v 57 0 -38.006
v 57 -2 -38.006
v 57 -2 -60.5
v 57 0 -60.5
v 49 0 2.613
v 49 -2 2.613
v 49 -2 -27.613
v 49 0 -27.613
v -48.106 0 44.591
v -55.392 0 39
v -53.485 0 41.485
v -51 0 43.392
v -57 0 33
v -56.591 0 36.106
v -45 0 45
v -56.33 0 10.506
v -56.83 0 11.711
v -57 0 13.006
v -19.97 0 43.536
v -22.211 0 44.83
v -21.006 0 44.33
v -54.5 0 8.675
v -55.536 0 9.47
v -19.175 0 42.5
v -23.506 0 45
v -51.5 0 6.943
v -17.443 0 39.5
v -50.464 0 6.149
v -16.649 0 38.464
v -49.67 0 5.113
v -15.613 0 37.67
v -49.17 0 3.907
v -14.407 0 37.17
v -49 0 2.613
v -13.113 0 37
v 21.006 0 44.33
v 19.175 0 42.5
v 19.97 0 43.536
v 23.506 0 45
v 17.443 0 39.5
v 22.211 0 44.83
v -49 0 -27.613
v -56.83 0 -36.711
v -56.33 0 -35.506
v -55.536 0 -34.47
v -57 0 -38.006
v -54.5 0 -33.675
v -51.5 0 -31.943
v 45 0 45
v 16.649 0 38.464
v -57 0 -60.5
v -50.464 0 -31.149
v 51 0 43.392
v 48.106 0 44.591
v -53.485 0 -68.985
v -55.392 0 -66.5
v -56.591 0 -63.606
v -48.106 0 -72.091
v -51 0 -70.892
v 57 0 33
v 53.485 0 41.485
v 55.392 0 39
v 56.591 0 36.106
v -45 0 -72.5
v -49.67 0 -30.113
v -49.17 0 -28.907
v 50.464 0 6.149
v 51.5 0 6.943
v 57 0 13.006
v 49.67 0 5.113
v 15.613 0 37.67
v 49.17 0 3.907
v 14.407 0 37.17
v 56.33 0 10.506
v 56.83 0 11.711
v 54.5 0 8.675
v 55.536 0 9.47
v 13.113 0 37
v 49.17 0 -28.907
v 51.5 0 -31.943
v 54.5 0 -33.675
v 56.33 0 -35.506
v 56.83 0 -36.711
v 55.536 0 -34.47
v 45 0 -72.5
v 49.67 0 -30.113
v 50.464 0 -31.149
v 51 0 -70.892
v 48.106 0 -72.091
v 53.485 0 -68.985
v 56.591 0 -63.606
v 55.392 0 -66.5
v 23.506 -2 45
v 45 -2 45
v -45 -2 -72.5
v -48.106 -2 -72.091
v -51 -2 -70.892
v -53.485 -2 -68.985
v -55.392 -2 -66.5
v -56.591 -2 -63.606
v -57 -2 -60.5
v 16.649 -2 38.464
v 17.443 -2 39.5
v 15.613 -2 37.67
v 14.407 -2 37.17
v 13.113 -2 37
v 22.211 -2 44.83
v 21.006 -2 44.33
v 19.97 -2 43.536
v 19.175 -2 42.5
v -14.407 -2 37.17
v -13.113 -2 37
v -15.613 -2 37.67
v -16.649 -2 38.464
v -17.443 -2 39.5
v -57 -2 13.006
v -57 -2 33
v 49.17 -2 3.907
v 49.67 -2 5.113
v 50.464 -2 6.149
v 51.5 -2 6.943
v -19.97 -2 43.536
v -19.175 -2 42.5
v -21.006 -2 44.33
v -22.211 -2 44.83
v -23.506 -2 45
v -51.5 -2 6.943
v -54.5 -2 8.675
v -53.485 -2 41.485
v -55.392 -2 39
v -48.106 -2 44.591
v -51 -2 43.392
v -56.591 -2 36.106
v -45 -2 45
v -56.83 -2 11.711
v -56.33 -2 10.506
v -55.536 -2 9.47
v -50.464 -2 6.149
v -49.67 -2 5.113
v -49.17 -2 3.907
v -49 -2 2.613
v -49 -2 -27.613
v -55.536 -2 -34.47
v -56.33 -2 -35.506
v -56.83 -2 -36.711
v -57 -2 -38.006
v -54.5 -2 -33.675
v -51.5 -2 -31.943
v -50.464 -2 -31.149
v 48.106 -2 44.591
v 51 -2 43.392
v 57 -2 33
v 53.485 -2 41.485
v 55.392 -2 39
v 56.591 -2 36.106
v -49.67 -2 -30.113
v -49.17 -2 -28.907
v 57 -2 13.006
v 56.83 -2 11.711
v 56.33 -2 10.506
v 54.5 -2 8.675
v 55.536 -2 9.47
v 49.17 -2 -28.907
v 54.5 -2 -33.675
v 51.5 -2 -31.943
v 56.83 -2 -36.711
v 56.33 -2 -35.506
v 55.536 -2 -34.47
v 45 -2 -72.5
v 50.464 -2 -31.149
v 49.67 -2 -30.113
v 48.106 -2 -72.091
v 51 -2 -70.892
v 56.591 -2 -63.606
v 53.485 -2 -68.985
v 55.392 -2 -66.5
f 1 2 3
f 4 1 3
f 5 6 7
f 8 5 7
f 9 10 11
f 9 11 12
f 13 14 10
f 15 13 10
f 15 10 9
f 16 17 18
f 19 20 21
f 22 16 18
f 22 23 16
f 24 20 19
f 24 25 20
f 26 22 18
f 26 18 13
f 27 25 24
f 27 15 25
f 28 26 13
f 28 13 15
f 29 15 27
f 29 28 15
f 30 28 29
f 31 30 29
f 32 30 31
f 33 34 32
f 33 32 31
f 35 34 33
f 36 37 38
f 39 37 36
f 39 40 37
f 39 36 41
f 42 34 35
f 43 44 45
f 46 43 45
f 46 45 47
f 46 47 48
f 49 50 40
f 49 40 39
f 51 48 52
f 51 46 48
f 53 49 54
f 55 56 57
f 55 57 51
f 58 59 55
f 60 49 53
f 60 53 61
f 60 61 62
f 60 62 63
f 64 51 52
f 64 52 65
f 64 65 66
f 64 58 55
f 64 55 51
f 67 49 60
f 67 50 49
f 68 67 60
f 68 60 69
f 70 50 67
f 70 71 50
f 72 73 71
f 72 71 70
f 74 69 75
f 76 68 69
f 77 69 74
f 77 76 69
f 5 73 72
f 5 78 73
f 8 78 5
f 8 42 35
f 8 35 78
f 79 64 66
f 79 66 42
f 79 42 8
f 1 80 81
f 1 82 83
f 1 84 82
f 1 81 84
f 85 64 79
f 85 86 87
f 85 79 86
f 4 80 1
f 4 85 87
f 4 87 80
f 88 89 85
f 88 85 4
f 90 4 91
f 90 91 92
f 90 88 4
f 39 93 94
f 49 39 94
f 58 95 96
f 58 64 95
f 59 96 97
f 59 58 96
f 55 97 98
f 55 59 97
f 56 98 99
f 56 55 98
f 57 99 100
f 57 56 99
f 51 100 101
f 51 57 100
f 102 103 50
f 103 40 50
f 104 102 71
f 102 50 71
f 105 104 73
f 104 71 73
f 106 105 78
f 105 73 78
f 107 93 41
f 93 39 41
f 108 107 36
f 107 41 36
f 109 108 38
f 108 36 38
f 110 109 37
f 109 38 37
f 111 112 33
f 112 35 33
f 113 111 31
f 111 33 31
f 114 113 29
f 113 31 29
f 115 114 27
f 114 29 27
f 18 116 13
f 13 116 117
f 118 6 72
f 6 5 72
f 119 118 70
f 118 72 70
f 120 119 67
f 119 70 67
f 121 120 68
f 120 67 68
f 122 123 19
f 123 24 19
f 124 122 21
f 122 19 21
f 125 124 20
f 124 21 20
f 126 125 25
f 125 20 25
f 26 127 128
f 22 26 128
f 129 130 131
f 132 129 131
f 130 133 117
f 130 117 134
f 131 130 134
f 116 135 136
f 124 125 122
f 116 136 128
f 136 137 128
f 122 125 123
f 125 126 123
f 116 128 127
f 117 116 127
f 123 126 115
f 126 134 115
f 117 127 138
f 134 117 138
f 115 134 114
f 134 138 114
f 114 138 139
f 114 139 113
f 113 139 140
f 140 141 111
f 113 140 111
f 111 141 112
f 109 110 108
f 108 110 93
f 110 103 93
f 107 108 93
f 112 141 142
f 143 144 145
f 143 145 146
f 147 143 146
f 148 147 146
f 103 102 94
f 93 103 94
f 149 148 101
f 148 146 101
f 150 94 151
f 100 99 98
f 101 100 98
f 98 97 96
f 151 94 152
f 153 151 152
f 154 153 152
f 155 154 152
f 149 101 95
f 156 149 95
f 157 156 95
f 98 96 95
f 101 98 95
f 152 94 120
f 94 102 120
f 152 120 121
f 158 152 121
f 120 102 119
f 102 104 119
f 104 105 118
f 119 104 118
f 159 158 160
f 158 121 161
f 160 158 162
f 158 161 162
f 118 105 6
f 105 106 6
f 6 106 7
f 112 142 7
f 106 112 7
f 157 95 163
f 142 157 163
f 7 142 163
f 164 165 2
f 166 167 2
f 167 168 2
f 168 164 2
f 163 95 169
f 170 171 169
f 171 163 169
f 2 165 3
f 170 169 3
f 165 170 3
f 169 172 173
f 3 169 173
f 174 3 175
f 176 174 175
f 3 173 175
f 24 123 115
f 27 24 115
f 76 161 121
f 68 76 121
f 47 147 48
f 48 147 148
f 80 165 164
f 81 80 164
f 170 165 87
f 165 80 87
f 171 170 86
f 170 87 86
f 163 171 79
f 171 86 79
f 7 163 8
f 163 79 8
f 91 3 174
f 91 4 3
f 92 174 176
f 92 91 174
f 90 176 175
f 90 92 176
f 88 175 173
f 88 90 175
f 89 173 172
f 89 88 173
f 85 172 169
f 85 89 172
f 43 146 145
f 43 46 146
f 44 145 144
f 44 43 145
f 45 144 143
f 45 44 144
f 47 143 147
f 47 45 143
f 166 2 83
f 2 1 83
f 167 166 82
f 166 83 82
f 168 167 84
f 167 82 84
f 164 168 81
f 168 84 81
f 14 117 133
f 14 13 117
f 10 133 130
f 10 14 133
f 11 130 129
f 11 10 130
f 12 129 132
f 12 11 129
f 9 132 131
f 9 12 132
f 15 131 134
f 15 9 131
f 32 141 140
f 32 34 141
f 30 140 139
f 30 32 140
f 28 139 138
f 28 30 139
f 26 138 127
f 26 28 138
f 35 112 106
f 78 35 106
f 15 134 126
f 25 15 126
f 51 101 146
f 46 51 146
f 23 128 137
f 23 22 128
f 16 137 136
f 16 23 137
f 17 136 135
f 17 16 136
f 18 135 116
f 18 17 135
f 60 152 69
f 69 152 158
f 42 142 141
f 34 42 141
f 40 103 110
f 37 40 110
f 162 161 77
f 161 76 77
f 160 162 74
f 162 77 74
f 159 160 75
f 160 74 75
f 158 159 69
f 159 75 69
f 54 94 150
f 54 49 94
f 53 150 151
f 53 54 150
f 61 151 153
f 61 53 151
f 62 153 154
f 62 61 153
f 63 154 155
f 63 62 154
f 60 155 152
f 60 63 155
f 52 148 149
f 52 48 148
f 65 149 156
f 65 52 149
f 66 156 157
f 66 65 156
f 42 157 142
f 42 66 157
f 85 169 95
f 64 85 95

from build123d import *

# Parameters (mm, degrees)
BOSS_EXTRUDE1_START = -2
BOSS_EXTRUDE1_DEPTH = 2
FILLET1_R           = 12
FILLET2_R           = 5
FILLET3_R           = 5


with BuildPart() as part:
    # Boss-Extrude1: read off the stored shape, not the designer's step
    # Boss-Extrude1 outline → Boss-Extrude1 (new body)
    with BuildSketch(Plane(origin=(0, 0, 0), x_dir=(1, 0, 0), z_dir=(0, 1, 0)).offset(BOSS_EXTRUDE1_START)):
        Polygon((57, 35.118802154), (57, 72.5), (-57, 72.5), (-57, 35.118802154), (-49, 30.5), (-49, -5.5), (-57, -10.118802154), (-57, -45), (-20.618802154, -45), (-16, -37), (16, -37), (20.618802154, -45), (57, -45), (57, -10.118802154), (49, -5.5), (49, 30.5), align=None)
    extrude(amount=BOSS_EXTRUDE1_DEPTH)

    # Fillet1
    fillet1_edges = [part.edges().sort_by_distance(p)[0] for p in [
        (57, -1, 45),
        (-57, -1, 45),
        (-57, -1, -72.5),
        (57, -1, -72.5),
    ]]
    fillet(fillet1_edges, radius=FILLET1_R)

    # Fillet2
    fillet2_edges = [part.edges().sort_by_distance(p)[0] for p in [
        (57, -1, -35.118802154),
        (57, -1, 10.118802154),
        (20.618802154, -1, 45),
        (-20.618802154, -1, 45),
        (-57, -1, 10.118802154),
        (-57, -1, -35.118802154),
    ]]
    fillet(fillet2_edges, radius=FILLET2_R)

    # Fillet3
    fillet3_edges = [part.edges().sort_by_distance(p)[0] for p in [
        (49, -1, -30.5),
        (49, -1, 5.5),
        (16, -1, 37),
        (-16, -1, 37),
        (-49, -1, 5.5),
        (-49, -1, -30.5),
    ]]
    fillet(fillet3_edges, radius=FILLET3_R)


solid = part.part
